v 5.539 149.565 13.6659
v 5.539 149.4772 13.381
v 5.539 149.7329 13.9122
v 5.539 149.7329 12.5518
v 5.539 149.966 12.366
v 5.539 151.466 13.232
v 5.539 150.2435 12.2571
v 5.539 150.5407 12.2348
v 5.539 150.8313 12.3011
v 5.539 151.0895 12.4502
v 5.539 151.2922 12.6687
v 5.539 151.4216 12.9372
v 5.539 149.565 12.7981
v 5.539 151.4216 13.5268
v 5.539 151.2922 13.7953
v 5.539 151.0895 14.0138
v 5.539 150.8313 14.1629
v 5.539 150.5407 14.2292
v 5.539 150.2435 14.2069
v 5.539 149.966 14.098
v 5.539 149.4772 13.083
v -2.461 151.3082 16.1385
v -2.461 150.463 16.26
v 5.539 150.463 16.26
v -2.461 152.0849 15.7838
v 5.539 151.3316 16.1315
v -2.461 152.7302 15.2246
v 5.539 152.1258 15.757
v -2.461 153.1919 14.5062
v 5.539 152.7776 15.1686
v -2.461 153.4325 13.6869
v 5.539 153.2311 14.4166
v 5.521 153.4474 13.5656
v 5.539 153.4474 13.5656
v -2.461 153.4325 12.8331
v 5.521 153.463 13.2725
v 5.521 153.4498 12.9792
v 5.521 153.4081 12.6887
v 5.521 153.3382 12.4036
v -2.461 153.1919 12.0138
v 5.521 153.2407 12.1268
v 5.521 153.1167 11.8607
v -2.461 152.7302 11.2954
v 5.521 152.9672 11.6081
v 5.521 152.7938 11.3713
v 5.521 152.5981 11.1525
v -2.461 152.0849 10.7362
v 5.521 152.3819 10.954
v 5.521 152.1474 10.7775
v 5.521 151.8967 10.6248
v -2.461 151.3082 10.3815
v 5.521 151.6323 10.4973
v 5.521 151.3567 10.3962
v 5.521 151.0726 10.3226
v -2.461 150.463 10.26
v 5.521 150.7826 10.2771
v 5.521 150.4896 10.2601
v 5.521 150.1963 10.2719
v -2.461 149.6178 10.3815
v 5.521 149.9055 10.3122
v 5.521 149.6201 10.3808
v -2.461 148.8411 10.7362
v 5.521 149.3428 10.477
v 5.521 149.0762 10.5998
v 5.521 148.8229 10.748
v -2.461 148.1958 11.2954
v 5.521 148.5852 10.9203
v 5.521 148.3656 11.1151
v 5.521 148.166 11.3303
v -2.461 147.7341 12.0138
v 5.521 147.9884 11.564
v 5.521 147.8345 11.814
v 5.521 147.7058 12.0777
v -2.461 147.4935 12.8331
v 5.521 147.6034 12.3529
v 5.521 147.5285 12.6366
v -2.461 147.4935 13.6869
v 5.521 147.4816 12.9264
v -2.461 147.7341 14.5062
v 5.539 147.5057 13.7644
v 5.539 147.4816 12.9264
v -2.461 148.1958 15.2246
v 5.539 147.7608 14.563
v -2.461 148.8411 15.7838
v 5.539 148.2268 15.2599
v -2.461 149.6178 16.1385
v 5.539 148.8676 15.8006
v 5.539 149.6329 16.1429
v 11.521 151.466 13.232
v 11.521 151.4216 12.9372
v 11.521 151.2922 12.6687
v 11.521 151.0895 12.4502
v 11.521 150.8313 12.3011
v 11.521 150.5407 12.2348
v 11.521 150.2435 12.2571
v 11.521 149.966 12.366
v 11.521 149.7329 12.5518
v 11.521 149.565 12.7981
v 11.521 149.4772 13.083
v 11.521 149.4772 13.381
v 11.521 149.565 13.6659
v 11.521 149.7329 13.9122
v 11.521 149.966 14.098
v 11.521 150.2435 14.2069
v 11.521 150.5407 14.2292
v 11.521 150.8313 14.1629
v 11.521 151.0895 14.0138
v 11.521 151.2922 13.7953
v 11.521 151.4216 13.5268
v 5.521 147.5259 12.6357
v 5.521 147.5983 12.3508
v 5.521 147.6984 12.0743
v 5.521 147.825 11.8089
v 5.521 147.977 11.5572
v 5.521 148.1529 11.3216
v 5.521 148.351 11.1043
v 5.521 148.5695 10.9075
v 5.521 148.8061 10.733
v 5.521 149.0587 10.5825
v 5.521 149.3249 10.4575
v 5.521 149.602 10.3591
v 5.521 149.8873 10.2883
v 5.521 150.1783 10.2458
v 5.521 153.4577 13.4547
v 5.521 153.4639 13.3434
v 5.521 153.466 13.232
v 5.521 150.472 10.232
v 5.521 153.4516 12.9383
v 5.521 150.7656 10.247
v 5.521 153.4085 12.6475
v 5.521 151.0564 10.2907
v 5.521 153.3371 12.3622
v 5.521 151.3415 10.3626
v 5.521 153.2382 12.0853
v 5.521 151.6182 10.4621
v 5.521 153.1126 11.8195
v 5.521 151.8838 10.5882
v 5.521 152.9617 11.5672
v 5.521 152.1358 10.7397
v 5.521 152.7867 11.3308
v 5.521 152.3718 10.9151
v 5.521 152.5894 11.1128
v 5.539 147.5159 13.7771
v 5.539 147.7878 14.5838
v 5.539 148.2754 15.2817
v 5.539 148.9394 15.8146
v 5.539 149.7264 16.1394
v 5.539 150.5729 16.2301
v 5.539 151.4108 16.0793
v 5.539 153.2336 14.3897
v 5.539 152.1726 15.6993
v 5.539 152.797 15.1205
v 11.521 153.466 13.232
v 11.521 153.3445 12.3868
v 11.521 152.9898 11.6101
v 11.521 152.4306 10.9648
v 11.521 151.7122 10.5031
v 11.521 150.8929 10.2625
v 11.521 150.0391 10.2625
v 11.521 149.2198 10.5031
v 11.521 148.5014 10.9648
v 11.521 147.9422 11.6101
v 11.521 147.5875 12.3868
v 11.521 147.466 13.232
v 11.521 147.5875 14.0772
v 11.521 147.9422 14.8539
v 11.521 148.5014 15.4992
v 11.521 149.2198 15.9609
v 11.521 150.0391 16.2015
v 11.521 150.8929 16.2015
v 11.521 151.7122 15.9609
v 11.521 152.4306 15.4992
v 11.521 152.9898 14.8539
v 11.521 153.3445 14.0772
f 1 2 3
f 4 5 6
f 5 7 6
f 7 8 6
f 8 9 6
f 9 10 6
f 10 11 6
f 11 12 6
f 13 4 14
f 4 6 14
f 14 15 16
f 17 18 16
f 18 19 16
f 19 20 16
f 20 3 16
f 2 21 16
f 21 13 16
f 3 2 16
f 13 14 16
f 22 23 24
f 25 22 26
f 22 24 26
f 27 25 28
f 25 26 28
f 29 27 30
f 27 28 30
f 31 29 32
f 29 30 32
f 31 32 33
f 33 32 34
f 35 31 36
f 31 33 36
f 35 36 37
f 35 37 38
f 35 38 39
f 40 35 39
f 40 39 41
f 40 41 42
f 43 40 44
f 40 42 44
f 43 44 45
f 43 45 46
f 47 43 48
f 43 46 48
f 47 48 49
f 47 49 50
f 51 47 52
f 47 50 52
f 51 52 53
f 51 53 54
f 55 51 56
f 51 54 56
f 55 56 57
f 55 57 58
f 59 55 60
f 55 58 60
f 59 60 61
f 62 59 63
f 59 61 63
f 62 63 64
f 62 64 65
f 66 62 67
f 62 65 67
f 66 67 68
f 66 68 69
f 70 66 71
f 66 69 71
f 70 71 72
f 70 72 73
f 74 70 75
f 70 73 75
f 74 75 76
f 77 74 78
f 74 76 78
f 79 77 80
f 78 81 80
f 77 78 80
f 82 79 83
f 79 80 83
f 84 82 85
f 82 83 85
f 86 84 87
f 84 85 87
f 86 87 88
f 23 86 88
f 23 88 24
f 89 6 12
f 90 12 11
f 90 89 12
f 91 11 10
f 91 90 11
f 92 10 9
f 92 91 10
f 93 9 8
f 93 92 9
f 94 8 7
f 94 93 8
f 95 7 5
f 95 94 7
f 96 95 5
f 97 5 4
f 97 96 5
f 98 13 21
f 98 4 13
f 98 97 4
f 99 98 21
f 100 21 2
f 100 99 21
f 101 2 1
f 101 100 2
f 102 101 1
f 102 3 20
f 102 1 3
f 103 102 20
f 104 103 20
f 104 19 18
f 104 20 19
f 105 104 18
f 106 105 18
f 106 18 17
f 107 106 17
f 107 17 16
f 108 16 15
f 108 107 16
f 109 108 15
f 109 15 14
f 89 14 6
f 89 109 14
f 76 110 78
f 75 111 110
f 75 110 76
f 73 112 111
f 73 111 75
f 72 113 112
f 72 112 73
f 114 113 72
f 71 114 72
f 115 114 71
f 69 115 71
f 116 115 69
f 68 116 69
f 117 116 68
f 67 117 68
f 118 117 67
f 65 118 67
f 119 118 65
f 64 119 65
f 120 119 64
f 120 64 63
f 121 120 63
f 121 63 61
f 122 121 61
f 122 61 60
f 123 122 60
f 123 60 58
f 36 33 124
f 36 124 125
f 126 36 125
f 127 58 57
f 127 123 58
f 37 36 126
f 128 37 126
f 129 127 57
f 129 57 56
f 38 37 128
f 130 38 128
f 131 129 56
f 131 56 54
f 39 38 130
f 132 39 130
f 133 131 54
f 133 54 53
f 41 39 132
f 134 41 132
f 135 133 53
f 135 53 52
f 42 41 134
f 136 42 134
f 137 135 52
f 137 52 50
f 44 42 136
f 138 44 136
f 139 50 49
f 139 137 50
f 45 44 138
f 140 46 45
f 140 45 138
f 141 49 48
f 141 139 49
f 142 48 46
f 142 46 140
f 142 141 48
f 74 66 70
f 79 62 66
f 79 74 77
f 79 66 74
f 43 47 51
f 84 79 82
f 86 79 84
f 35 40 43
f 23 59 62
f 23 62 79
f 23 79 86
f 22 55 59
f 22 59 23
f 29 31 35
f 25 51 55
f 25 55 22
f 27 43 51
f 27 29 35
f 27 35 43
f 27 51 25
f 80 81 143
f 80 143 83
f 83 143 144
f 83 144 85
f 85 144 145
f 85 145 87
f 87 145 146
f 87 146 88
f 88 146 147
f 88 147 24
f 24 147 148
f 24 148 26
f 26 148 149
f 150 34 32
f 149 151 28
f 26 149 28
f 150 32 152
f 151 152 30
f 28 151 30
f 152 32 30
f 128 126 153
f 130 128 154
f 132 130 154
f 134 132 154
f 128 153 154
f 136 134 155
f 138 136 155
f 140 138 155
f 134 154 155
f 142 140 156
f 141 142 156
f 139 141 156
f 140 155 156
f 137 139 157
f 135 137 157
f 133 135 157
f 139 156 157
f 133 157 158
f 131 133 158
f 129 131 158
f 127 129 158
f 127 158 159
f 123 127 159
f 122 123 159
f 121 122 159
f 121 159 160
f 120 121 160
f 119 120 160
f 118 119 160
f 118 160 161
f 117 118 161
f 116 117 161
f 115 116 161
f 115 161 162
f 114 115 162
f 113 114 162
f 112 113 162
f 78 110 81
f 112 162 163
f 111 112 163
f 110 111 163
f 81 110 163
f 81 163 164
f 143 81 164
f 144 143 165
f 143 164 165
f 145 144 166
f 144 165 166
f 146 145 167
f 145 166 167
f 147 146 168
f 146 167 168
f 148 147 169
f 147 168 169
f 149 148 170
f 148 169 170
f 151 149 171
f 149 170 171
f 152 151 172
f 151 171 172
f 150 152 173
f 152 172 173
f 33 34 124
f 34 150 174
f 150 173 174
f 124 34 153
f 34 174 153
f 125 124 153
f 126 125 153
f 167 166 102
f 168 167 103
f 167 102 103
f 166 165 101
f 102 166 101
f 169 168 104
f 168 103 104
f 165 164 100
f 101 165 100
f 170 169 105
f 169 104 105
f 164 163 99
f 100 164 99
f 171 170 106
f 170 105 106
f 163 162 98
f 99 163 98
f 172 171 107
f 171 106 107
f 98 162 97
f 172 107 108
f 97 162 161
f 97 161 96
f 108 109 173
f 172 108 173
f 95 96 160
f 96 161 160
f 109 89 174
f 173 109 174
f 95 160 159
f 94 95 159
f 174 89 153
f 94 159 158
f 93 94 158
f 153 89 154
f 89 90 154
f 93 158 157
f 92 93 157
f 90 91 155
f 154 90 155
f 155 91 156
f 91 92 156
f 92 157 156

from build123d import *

# Parameters (mm, degrees)
CYLINDER022_R     = 3
CYLINDER022_DEPTH = 8
TUBE001_R         = 3
TUBE001_R_2       = 1
TUBE001_DEPTH     = 6


with BuildPart() as cylinder022:
    # Cylinder022 → Cylinder022 (new body)
    with BuildSketch(Plane(origin=(28.57, 150.463, 13.35), x_dir=(0, 0, 1), z_dir=(-1, 0, 0))):
        Circle(CYLINDER022_R)
    extrude(amount=CYLINDER022_DEPTH)


with BuildPart() as fusion001:
    # Tube001 → Tube001 (new body)
    with BuildSketch(Plane(origin=(34.552, 150.466, 13.322), x_dir=(0, 1, 0), z_dir=(-1, 0, 0))):
        Circle(TUBE001_R)
        Circle(TUBE001_R_2, mode=Mode.SUBTRACT)
    extrude(amount=TUBE001_DEPTH)

    # Fusion001: union Cylinder022
    add(cylinder022.part)


with BuildPart() as fusion001_1:
    # Fusion001 placement: moved
    add(fusion001.part.moved(Location((-23.031, 0, -0.09))))


solid = fusion001_1.part
